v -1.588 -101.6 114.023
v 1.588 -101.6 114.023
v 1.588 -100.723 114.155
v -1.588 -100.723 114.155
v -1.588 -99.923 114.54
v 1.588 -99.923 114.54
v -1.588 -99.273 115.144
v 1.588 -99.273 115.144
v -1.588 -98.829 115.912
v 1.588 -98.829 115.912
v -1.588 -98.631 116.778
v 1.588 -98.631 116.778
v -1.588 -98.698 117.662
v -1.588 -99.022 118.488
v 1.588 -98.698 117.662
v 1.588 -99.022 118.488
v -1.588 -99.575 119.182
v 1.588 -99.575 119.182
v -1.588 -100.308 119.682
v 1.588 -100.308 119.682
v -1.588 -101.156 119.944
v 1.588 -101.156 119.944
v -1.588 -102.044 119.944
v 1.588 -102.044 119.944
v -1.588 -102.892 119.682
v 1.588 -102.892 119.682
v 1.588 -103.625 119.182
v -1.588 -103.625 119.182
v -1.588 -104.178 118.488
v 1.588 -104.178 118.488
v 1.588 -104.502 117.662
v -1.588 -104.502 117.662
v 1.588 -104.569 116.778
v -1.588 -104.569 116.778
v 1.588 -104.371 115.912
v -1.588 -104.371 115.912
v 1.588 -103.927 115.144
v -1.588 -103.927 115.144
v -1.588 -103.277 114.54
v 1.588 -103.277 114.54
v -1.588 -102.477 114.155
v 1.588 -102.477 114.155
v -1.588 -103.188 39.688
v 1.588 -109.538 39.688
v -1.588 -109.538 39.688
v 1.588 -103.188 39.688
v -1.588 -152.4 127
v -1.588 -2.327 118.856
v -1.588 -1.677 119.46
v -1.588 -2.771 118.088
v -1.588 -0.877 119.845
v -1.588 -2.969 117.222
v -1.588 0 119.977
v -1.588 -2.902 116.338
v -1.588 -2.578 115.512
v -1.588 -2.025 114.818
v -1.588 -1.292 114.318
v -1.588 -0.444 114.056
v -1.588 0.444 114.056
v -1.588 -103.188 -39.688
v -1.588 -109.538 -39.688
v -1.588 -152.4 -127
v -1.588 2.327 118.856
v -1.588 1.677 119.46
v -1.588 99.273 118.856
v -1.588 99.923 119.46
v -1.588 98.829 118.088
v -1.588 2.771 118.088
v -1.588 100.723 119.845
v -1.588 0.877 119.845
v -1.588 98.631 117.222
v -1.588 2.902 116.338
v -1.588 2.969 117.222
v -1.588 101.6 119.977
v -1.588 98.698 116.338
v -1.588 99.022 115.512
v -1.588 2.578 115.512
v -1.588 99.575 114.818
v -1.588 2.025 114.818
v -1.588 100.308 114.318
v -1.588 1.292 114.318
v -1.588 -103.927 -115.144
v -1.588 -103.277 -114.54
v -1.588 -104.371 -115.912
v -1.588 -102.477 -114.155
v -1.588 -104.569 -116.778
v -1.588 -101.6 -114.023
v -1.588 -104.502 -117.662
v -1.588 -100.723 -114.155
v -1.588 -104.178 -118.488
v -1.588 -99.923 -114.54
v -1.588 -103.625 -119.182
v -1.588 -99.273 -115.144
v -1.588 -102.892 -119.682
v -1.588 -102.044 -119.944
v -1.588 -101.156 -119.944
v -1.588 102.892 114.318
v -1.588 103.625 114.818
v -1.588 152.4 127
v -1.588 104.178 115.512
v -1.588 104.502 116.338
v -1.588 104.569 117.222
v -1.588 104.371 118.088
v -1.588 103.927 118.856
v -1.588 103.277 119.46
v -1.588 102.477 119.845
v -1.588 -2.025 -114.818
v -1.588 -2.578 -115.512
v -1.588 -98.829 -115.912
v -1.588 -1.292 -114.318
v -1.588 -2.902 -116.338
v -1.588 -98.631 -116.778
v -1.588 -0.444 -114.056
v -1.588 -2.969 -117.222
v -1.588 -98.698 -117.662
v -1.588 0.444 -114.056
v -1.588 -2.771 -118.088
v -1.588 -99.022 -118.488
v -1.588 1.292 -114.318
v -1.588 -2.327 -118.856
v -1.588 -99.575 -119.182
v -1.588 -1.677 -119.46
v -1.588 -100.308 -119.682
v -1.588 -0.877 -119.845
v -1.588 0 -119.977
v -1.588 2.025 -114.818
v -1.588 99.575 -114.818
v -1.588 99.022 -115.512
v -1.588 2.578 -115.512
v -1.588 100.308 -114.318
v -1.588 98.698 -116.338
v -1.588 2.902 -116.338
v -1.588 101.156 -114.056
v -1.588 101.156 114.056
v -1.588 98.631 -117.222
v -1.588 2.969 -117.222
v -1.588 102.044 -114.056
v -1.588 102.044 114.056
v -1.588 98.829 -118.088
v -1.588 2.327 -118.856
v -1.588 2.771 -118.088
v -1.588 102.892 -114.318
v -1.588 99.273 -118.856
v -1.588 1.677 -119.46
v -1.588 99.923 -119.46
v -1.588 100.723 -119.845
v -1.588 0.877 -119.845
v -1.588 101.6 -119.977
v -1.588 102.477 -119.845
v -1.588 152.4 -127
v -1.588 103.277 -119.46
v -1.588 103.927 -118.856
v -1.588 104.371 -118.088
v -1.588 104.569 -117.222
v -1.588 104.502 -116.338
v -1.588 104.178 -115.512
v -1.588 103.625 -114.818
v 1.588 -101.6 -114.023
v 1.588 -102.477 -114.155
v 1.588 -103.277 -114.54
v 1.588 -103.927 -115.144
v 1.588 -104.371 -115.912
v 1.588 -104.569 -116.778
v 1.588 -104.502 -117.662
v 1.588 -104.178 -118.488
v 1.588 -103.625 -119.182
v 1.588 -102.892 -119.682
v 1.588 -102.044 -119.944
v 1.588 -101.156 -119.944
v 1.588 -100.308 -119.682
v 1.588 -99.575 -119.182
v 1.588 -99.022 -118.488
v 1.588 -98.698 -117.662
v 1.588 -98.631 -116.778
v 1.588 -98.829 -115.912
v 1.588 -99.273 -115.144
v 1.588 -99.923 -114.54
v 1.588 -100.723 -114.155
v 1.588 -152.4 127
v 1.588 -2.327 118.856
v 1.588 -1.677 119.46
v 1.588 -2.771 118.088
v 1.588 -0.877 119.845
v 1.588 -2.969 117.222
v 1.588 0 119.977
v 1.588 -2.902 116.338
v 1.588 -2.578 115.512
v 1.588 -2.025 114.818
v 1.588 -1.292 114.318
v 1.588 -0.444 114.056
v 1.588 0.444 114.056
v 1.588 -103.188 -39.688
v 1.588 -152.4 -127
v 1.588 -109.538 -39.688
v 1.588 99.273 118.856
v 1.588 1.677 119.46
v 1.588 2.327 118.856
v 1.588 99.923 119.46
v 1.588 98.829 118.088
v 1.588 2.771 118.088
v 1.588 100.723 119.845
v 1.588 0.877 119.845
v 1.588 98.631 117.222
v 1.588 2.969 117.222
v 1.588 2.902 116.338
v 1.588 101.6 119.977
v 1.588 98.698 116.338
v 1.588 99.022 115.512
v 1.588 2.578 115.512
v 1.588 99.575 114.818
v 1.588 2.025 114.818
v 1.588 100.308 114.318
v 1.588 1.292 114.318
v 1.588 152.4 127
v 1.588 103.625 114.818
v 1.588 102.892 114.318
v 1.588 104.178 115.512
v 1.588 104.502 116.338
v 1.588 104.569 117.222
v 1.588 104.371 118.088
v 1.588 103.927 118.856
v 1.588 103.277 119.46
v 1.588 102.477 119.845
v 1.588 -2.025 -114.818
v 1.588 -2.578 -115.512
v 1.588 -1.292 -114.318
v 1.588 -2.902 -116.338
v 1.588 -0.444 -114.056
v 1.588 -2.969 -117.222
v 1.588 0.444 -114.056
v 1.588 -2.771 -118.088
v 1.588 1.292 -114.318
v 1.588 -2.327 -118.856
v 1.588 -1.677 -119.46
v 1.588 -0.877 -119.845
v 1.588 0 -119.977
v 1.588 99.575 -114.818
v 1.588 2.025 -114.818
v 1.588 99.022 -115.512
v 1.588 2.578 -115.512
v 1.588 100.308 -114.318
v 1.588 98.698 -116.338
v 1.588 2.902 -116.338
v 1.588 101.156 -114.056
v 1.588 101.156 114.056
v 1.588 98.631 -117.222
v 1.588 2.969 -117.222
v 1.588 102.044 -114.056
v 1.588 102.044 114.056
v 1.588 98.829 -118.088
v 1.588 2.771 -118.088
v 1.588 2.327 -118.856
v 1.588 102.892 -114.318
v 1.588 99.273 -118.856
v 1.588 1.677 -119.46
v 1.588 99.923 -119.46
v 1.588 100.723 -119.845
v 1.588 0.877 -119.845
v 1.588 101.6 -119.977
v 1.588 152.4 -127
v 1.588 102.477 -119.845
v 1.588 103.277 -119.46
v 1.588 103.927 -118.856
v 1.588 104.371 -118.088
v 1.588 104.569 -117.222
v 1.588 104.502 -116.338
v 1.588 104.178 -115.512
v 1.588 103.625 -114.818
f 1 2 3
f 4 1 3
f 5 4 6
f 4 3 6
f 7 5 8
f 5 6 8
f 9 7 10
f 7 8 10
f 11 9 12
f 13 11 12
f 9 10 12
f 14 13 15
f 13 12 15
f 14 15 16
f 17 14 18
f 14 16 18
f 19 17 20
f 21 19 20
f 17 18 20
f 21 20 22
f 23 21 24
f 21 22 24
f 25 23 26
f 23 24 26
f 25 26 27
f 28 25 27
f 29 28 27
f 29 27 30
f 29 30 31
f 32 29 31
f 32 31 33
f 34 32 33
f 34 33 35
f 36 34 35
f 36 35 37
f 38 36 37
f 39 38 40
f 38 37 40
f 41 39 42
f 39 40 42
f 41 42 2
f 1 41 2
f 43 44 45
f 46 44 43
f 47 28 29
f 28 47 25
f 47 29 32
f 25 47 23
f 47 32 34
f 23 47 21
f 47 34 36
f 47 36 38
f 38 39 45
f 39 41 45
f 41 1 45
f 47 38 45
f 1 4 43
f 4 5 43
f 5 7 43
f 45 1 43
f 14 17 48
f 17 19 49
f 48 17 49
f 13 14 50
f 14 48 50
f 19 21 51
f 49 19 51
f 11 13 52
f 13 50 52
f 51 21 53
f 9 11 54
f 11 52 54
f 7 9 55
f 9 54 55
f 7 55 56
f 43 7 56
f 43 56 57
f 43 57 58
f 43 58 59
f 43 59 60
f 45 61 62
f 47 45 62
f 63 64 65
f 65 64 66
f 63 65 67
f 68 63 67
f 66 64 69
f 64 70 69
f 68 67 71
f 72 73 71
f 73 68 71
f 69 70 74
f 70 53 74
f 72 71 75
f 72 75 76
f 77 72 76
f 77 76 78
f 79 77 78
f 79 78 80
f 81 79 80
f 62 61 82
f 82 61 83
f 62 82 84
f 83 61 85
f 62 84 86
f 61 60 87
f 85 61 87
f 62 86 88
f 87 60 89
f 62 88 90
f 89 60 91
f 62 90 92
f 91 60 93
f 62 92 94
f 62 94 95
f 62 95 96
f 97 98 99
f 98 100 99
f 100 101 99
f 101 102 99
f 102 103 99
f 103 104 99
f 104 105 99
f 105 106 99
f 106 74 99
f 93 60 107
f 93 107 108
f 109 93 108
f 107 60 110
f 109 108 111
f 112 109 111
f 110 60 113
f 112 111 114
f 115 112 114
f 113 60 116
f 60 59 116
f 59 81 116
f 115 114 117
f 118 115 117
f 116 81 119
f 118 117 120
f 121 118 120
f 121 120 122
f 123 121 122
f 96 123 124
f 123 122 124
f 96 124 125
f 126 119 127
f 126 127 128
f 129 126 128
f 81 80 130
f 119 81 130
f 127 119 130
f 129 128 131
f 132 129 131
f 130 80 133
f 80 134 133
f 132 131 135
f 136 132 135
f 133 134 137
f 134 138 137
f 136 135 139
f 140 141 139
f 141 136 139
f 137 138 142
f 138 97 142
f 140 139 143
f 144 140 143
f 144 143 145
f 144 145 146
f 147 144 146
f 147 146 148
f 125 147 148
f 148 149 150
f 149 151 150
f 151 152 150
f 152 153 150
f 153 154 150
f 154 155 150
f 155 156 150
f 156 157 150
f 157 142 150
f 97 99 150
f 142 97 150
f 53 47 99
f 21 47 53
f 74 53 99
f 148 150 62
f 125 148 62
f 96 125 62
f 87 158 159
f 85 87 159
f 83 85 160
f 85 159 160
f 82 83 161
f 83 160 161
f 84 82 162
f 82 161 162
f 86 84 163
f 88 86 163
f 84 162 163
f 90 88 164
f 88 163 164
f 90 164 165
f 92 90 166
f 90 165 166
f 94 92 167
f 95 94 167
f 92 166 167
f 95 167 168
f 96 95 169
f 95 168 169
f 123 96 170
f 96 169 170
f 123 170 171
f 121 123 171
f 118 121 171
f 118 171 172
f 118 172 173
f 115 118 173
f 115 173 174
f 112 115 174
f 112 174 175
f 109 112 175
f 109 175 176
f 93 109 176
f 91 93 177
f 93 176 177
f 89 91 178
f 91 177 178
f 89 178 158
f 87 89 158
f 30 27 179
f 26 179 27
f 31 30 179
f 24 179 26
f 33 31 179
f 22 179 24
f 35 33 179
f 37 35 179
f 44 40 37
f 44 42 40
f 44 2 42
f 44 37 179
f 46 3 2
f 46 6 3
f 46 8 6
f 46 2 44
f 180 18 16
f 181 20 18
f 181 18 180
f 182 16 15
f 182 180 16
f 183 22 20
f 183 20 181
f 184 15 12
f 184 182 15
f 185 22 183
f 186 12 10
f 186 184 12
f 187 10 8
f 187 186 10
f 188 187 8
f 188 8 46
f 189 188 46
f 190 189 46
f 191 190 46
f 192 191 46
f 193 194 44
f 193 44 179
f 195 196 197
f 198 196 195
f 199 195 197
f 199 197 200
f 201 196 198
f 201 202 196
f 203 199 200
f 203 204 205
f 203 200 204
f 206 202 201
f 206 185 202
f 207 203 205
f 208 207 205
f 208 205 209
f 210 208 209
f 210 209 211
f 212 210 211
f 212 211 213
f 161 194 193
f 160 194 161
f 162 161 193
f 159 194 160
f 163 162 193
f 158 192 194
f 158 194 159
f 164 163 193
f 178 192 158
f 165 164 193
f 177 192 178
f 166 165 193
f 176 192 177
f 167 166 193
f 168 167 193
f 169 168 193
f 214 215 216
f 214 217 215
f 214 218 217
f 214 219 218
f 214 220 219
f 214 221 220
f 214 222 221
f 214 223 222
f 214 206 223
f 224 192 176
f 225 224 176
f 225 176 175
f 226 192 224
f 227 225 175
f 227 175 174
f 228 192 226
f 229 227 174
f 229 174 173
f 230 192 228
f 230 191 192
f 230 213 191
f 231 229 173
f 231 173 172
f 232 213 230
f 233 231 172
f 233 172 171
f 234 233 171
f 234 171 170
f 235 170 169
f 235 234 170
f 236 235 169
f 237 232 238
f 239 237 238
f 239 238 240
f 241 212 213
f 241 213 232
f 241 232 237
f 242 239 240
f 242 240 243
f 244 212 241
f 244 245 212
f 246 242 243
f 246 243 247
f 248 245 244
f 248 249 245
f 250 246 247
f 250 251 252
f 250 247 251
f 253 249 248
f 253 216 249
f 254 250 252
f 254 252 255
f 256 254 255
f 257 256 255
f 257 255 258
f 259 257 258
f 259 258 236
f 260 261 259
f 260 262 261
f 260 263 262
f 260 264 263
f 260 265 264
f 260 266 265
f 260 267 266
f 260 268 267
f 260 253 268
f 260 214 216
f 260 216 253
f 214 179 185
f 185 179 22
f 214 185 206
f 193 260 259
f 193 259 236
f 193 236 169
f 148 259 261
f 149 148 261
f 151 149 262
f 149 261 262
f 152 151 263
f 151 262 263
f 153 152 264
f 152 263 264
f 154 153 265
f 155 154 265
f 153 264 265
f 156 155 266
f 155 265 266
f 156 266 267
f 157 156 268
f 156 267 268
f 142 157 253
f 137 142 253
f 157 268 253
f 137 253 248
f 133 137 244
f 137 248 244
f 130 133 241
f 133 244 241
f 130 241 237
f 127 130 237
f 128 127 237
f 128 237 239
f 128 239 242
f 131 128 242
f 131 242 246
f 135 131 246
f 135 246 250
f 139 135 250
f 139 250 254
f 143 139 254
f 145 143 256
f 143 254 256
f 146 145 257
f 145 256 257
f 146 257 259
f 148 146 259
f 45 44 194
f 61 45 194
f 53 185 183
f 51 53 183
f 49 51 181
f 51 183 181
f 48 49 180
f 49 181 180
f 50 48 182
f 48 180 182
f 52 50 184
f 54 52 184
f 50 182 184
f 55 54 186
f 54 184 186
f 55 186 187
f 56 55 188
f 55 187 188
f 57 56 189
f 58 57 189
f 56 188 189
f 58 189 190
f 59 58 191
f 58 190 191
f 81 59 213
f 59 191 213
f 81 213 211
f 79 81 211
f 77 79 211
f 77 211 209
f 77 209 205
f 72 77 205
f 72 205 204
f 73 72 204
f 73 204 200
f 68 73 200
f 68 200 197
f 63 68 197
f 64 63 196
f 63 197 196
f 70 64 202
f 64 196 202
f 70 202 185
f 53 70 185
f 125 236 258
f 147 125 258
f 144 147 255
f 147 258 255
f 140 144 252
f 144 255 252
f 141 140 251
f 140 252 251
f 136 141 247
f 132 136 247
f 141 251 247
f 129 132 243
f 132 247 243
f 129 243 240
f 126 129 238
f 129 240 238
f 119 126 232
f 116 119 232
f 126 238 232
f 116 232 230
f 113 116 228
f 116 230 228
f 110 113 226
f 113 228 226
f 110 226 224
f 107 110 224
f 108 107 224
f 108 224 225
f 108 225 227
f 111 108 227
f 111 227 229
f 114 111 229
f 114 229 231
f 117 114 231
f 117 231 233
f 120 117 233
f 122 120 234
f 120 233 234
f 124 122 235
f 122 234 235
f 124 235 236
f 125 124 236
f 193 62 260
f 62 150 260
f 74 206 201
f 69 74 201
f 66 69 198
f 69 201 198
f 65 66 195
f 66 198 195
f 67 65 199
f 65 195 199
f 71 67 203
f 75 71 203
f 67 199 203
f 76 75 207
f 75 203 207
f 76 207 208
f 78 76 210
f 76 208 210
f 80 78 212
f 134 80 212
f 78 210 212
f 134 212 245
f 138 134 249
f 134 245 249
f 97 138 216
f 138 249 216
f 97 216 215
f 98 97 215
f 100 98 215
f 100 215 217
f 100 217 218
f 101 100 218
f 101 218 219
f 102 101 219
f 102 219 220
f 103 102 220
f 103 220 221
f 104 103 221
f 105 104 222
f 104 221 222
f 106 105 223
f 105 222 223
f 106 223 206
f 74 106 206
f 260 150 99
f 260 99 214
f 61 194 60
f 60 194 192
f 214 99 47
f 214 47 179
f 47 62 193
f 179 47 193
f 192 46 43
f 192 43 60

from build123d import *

# Parameters (mm, degrees)
SKETCH1_W           = 3.175
SKETCH1_H           = 254
BOSS_EXTRUDE1_DEPTH = 152.4
SKETCH2_W           = 79.375
SKETCH2_H           = 6.35
CUT_EXTRUDE1_DEPTH  = 3.175
SKETCH3_R           = 2.97688
CUT_EXTRUDE2_DEPTH  = 3.175


with BuildPart() as part:
    # Sketch1 → Boss-Extrude1 (new, symmetric)
    with BuildSketch(Plane(origin=(0, 0, 0), x_dir=(1, 0, 0), z_dir=(0, 1, 0))):
        Rectangle(SKETCH1_W, SKETCH1_H)
    extrude(amount=BOSS_EXTRUDE1_DEPTH, both=True)

    # Sketch2 → Cut-Extrude1 (cut)
    with BuildSketch(Plane(origin=(1.5875, 0, 0), x_dir=(0, 0, -1), z_dir=(1, 0, 0))):
        with Locations((0, -106.3625)):
            Rectangle(SKETCH2_W, SKETCH2_H)
    extrude(amount=-CUT_EXTRUDE1_DEPTH, mode=Mode.SUBTRACT)

    # Sketch3 → Cut-Extrude2 (cut)
    with BuildSketch(Plane(origin=(1.5875, 0, 0), x_dir=(0, 0, -1), z_dir=(1, 0, 0))):
        with Locations((117, 0)):
            Circle(SKETCH3_R)
        with Locations((117, 101.6)):
            Circle(SKETCH3_R)
        with Locations(Location((117, -101.6, 0), (0, 0, 180))):
            Circle(SKETCH3_R)
        with Locations((-117, -101.6)):
            Circle(SKETCH3_R)
        with Locations(Location((-117, 0, 0), (0, 0, 180))):
            Circle(SKETCH3_R)
        with Locations(Location((-117, 101.6, 0), (0, 0, 180))):
            Circle(SKETCH3_R)
    extrude(amount=-CUT_EXTRUDE2_DEPTH, mode=Mode.SUBTRACT)


solid = part.part
